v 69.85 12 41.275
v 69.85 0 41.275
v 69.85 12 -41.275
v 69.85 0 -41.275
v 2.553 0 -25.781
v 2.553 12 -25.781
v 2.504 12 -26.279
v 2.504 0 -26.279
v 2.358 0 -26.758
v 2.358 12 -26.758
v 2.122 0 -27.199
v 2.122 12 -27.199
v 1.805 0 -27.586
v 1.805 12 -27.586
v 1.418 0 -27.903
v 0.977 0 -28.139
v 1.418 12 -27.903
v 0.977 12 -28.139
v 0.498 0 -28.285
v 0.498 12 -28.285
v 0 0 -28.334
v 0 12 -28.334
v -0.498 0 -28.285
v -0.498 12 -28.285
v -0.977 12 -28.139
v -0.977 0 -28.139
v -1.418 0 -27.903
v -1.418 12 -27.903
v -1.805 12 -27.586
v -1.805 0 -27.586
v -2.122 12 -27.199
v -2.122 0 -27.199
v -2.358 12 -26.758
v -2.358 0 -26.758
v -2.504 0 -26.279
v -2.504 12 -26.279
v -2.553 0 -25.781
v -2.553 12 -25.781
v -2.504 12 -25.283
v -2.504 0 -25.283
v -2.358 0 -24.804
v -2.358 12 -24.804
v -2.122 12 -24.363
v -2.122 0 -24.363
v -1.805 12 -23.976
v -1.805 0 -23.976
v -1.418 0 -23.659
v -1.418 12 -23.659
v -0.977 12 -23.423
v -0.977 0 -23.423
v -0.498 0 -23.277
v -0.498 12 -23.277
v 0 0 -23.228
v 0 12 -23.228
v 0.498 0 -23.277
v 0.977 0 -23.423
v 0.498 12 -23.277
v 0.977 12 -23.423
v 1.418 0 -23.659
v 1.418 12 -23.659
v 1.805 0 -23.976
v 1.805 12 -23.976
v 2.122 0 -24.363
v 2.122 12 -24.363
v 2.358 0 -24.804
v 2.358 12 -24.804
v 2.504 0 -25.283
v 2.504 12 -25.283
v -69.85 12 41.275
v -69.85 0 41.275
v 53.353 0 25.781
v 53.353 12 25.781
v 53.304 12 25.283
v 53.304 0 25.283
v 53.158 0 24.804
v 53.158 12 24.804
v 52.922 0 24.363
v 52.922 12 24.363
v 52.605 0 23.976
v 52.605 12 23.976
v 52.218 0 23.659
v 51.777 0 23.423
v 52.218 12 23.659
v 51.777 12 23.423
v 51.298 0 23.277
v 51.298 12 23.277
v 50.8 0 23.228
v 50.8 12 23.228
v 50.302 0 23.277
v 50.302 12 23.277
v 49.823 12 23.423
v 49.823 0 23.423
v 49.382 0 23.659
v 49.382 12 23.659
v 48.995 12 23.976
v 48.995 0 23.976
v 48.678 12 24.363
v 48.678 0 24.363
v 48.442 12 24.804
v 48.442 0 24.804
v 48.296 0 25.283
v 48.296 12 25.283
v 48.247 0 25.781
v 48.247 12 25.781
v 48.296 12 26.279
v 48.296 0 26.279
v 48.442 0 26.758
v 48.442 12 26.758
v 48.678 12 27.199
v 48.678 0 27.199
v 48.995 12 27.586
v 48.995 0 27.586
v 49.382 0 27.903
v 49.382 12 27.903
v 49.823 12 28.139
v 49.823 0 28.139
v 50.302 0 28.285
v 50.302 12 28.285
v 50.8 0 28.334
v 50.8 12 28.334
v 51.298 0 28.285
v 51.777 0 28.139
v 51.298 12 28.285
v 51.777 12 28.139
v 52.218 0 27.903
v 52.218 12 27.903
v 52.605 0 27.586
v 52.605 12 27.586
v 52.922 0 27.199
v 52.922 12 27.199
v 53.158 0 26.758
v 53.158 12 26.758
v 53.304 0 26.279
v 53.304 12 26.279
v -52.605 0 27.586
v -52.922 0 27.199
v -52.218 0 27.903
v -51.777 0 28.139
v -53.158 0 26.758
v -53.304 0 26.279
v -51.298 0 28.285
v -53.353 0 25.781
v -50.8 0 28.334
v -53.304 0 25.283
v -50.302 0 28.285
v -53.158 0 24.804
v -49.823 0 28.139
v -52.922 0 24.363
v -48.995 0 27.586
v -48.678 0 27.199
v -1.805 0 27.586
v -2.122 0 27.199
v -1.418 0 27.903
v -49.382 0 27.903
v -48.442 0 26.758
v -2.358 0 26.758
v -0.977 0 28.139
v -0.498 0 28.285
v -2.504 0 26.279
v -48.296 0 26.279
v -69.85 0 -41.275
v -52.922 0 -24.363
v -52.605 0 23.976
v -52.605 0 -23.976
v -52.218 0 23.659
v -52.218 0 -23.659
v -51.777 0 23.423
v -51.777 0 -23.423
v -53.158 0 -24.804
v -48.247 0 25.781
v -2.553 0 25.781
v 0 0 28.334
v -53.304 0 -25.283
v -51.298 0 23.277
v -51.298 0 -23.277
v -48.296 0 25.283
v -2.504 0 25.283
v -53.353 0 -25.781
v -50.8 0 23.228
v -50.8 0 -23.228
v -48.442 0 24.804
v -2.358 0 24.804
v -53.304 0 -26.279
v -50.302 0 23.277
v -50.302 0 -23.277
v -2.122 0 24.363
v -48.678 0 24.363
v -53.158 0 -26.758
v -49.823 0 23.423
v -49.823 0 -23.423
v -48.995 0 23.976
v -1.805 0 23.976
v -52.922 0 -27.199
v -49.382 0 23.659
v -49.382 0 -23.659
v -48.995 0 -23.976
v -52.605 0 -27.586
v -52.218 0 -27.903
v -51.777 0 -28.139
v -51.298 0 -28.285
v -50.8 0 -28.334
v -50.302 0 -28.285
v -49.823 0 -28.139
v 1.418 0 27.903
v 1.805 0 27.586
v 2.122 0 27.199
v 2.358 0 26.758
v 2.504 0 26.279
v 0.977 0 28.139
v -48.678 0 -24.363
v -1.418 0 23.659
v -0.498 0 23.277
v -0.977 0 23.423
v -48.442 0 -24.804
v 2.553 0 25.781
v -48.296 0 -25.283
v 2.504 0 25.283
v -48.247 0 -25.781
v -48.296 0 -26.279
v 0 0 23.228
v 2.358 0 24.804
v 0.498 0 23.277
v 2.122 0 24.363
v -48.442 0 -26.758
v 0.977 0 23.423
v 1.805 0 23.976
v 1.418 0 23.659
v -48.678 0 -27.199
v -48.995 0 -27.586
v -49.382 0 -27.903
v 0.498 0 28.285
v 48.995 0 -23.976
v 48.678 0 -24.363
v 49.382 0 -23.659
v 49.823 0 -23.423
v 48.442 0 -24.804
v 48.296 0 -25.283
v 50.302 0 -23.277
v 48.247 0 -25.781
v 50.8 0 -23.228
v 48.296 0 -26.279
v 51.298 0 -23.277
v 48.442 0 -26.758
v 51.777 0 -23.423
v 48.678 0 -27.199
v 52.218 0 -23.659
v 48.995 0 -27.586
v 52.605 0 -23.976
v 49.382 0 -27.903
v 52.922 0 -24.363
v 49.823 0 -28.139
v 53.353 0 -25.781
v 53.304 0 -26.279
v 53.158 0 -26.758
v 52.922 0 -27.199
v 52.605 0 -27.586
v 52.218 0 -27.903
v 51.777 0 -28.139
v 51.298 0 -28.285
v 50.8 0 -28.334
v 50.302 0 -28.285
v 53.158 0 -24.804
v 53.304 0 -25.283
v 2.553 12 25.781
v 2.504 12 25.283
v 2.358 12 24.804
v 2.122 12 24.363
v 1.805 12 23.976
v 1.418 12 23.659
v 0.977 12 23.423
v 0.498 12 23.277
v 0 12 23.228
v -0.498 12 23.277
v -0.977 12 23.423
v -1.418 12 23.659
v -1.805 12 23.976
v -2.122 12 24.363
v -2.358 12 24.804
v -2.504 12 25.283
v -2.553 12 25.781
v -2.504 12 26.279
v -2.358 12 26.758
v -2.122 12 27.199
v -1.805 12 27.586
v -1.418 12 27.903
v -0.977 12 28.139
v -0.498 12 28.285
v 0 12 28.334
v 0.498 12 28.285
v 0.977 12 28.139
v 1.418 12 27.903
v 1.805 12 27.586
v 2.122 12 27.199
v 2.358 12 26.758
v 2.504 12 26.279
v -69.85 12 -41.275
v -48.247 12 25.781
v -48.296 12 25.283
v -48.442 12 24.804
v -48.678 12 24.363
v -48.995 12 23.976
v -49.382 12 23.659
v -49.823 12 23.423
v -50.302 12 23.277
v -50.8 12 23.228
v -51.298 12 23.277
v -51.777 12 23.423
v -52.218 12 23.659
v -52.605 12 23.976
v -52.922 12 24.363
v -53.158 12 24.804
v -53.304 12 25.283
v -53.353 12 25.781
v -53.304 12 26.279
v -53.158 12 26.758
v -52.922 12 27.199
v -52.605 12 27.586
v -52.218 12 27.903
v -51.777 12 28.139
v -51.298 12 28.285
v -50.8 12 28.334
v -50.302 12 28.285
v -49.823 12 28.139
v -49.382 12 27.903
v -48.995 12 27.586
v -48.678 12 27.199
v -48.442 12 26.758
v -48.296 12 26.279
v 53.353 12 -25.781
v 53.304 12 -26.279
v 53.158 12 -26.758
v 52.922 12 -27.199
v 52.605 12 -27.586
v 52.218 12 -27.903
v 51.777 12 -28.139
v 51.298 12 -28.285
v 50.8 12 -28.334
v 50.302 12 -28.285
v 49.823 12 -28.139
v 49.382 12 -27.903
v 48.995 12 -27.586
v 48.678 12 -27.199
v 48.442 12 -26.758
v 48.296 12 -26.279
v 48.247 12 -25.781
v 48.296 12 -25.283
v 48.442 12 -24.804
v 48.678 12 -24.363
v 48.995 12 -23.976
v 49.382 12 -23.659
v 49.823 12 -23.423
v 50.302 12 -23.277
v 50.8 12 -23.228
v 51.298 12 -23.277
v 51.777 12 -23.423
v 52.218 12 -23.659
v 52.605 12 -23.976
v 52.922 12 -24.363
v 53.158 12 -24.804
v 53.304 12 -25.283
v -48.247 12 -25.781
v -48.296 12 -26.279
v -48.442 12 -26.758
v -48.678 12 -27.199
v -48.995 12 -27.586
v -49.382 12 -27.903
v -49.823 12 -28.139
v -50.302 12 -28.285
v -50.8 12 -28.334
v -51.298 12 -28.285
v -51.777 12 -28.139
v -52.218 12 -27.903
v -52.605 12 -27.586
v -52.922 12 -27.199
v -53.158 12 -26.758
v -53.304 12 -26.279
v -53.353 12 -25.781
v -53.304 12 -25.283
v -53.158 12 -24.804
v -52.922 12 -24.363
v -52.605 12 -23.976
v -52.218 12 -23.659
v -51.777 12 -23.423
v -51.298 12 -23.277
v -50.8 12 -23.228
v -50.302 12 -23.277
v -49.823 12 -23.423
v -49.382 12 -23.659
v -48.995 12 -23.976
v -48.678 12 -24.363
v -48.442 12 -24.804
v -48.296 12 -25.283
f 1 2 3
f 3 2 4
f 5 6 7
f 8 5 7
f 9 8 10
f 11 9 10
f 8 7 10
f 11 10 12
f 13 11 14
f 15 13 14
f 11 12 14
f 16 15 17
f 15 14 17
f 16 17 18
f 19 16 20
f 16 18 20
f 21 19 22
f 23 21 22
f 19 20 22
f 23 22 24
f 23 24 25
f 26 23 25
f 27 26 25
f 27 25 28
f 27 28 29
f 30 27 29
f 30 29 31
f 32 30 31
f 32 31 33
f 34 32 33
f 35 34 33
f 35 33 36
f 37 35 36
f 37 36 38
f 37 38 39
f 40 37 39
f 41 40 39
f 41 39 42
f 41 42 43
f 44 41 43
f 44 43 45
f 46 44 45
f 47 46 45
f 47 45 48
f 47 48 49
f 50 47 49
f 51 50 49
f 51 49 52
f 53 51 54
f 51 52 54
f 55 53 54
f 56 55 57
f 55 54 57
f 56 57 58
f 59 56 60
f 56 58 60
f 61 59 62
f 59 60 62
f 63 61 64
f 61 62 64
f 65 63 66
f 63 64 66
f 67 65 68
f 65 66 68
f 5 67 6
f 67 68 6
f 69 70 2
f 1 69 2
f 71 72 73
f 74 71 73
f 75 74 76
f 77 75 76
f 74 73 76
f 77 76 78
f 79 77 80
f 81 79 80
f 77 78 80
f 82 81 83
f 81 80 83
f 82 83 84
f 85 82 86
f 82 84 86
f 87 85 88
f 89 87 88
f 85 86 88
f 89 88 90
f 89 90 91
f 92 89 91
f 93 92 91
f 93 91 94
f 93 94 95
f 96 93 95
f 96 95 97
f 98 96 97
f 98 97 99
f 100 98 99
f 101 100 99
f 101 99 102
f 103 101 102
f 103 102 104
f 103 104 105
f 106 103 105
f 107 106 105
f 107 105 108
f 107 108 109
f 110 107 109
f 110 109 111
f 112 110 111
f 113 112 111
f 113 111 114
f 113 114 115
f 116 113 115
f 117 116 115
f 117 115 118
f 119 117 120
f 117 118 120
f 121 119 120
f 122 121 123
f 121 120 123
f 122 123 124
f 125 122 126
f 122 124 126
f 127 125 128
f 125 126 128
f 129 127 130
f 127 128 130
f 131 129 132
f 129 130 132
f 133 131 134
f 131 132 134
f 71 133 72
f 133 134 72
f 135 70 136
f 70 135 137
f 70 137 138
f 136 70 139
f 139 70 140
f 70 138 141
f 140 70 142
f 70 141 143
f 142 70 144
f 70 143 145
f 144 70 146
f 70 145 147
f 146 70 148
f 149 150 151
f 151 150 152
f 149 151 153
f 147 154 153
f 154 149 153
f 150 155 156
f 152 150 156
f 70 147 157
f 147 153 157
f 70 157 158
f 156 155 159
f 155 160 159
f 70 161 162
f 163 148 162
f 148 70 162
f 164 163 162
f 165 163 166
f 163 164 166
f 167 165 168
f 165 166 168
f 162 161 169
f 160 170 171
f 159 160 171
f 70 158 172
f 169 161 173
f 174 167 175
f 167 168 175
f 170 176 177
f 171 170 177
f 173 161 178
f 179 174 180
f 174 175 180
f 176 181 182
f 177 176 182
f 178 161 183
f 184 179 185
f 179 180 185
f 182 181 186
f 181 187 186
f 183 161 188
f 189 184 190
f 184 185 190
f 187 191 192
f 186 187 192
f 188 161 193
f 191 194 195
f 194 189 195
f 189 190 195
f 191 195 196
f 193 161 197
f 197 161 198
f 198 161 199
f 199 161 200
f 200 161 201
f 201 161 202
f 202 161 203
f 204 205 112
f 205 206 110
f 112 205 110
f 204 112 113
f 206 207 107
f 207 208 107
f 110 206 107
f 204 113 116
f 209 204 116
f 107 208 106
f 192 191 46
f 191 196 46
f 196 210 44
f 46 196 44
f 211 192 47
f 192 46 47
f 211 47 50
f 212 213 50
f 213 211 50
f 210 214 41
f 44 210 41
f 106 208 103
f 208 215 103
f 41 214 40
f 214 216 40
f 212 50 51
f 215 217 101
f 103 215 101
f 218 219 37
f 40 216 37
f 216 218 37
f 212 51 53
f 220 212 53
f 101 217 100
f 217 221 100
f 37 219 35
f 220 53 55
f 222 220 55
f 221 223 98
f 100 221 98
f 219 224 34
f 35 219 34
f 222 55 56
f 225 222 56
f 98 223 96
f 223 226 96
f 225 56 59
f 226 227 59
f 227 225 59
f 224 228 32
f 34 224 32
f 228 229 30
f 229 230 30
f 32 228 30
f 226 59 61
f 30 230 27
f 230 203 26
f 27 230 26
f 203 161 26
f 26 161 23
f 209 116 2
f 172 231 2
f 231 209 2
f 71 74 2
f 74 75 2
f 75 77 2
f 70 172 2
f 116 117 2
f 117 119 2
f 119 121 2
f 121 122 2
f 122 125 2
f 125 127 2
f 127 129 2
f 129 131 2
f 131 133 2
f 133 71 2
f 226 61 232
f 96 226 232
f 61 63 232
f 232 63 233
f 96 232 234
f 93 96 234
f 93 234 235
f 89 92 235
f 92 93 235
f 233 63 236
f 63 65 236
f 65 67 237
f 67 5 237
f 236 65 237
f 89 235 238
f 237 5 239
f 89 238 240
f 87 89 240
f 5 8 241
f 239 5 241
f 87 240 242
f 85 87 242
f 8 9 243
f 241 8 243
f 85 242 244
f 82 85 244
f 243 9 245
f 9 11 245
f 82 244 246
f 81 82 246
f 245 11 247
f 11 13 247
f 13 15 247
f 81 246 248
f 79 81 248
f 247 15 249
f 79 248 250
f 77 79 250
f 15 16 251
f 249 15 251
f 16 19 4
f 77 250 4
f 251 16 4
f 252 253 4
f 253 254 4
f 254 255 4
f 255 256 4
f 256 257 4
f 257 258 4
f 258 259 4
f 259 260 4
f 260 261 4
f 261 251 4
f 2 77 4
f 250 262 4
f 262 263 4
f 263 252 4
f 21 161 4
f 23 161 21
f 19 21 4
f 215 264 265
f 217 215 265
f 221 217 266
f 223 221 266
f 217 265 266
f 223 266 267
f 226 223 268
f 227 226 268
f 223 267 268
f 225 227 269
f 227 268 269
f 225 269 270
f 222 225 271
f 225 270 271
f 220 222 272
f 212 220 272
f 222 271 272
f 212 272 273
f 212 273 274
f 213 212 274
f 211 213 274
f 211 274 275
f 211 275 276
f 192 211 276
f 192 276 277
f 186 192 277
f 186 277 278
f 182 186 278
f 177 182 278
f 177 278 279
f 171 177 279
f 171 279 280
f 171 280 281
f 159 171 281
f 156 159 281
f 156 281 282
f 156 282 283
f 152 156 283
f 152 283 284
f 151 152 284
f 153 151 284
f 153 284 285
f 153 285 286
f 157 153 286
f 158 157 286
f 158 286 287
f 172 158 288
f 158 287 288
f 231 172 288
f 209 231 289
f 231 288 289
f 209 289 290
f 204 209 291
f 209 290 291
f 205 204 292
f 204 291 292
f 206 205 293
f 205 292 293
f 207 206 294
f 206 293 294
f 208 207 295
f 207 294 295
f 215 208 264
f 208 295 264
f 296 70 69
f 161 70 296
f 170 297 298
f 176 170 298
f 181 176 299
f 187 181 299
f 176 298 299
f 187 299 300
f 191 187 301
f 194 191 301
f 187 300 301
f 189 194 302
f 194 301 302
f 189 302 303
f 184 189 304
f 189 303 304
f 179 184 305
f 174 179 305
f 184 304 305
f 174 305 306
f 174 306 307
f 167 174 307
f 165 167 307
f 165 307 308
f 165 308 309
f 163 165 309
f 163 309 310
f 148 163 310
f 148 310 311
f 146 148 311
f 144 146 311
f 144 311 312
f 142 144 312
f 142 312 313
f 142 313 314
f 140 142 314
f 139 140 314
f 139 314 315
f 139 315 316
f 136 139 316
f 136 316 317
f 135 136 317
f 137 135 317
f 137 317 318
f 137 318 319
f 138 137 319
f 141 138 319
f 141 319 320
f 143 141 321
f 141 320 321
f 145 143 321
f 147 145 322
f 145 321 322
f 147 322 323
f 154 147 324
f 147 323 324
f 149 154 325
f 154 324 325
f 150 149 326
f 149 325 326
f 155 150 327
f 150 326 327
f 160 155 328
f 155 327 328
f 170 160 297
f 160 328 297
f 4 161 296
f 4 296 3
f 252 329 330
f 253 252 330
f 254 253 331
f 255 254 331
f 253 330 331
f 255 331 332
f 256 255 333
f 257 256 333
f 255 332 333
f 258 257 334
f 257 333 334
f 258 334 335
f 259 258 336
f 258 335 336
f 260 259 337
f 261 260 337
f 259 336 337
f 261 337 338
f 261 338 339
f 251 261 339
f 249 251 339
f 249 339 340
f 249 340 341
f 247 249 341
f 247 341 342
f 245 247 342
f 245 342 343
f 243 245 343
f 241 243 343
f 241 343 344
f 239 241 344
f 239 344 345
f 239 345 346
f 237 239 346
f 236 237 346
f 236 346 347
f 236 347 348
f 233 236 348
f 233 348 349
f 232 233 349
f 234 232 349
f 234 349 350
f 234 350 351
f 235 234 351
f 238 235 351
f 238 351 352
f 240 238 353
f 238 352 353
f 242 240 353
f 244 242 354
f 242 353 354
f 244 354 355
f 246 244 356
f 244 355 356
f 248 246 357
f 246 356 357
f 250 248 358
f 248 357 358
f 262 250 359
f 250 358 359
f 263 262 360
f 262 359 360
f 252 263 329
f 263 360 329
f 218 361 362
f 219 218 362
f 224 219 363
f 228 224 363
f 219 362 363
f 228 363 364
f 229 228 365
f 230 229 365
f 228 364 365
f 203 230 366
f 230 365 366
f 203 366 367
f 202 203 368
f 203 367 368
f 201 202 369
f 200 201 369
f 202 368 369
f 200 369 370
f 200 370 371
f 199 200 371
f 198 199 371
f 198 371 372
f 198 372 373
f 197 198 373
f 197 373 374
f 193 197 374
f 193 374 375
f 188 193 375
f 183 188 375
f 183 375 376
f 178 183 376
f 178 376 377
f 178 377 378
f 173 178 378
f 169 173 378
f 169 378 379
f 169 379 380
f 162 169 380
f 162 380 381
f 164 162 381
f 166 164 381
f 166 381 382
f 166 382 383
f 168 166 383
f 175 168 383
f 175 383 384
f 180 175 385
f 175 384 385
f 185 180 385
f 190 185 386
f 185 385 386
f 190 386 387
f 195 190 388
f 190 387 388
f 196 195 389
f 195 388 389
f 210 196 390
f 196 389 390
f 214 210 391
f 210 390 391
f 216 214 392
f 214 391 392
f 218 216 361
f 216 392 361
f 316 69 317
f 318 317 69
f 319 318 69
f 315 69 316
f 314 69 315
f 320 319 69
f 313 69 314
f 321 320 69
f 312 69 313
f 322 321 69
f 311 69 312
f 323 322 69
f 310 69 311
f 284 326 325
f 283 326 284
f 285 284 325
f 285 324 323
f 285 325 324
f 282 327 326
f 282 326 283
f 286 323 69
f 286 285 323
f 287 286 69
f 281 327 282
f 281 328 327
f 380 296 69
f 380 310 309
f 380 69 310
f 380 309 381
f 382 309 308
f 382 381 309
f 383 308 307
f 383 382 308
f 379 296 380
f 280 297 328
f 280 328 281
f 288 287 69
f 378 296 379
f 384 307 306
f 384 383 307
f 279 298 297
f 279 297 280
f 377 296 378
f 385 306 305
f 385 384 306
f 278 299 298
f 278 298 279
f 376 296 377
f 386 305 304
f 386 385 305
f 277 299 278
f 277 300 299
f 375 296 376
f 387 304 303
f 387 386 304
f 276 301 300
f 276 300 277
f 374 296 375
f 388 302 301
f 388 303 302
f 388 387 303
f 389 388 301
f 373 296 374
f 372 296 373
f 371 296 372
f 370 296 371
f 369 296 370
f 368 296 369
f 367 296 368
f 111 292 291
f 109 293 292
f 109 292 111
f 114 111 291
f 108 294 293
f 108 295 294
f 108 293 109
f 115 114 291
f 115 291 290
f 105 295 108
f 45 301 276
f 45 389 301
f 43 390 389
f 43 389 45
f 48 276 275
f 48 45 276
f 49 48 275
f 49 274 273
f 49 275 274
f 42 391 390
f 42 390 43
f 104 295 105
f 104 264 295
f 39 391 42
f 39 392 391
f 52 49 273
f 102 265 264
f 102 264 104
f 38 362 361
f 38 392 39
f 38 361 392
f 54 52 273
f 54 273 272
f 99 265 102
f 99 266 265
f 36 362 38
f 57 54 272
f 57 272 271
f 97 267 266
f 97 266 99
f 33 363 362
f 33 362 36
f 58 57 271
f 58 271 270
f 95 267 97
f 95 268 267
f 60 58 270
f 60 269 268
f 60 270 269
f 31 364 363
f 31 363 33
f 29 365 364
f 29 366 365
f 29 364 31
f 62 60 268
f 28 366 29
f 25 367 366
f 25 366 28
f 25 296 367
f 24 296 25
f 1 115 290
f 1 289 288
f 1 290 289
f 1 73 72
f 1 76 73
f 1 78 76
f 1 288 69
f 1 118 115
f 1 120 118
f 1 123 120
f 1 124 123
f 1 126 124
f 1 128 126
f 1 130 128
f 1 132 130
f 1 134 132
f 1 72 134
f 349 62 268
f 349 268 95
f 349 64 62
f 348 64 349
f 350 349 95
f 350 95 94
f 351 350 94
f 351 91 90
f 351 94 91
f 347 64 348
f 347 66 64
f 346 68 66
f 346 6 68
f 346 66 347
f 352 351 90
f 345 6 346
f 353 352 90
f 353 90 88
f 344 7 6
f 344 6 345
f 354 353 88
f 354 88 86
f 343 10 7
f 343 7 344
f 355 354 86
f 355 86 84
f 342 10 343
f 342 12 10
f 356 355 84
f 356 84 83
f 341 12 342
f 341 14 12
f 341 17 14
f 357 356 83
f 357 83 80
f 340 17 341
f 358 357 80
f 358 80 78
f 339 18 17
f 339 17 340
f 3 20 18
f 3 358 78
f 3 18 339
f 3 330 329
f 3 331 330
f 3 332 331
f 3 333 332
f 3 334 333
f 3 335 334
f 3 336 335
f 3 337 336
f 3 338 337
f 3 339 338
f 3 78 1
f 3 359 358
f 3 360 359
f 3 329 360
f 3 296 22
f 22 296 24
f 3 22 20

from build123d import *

# Parameters (mm, degrees)
SKETCH1_W              = 139.7
SKETCH1_H              = 82.55
BOSS_EXTRUDE1_DEPTH    = 12
F_10_CLEARANCE_HOLE1_D = 5.1054


with BuildPart() as part:
    # Sketch1 → Boss-Extrude1 (new body)
    with BuildSketch(Plane(origin=(0, 0, 0), x_dir=(1, 0, 0), z_dir=(0, 1, 0))):
        Rectangle(SKETCH1_W, SKETCH1_H)
    extrude(amount=BOSS_EXTRUDE1_DEPTH)

    # #10 Clearance Hole1 (through all)
    with Locations(Plane(origin=(0, 0, 0), x_dir=(-1, 0, 0), z_dir=(0, -1, 0))):
        with Locations((-50.8, 25.781), (0, 25.781), (50.8, 25.781), (50.8, -25.781), (0, -25.781), (-50.8, -25.781)):
            Hole(F_10_CLEARANCE_HOLE1_D / 2)


solid = part.part
